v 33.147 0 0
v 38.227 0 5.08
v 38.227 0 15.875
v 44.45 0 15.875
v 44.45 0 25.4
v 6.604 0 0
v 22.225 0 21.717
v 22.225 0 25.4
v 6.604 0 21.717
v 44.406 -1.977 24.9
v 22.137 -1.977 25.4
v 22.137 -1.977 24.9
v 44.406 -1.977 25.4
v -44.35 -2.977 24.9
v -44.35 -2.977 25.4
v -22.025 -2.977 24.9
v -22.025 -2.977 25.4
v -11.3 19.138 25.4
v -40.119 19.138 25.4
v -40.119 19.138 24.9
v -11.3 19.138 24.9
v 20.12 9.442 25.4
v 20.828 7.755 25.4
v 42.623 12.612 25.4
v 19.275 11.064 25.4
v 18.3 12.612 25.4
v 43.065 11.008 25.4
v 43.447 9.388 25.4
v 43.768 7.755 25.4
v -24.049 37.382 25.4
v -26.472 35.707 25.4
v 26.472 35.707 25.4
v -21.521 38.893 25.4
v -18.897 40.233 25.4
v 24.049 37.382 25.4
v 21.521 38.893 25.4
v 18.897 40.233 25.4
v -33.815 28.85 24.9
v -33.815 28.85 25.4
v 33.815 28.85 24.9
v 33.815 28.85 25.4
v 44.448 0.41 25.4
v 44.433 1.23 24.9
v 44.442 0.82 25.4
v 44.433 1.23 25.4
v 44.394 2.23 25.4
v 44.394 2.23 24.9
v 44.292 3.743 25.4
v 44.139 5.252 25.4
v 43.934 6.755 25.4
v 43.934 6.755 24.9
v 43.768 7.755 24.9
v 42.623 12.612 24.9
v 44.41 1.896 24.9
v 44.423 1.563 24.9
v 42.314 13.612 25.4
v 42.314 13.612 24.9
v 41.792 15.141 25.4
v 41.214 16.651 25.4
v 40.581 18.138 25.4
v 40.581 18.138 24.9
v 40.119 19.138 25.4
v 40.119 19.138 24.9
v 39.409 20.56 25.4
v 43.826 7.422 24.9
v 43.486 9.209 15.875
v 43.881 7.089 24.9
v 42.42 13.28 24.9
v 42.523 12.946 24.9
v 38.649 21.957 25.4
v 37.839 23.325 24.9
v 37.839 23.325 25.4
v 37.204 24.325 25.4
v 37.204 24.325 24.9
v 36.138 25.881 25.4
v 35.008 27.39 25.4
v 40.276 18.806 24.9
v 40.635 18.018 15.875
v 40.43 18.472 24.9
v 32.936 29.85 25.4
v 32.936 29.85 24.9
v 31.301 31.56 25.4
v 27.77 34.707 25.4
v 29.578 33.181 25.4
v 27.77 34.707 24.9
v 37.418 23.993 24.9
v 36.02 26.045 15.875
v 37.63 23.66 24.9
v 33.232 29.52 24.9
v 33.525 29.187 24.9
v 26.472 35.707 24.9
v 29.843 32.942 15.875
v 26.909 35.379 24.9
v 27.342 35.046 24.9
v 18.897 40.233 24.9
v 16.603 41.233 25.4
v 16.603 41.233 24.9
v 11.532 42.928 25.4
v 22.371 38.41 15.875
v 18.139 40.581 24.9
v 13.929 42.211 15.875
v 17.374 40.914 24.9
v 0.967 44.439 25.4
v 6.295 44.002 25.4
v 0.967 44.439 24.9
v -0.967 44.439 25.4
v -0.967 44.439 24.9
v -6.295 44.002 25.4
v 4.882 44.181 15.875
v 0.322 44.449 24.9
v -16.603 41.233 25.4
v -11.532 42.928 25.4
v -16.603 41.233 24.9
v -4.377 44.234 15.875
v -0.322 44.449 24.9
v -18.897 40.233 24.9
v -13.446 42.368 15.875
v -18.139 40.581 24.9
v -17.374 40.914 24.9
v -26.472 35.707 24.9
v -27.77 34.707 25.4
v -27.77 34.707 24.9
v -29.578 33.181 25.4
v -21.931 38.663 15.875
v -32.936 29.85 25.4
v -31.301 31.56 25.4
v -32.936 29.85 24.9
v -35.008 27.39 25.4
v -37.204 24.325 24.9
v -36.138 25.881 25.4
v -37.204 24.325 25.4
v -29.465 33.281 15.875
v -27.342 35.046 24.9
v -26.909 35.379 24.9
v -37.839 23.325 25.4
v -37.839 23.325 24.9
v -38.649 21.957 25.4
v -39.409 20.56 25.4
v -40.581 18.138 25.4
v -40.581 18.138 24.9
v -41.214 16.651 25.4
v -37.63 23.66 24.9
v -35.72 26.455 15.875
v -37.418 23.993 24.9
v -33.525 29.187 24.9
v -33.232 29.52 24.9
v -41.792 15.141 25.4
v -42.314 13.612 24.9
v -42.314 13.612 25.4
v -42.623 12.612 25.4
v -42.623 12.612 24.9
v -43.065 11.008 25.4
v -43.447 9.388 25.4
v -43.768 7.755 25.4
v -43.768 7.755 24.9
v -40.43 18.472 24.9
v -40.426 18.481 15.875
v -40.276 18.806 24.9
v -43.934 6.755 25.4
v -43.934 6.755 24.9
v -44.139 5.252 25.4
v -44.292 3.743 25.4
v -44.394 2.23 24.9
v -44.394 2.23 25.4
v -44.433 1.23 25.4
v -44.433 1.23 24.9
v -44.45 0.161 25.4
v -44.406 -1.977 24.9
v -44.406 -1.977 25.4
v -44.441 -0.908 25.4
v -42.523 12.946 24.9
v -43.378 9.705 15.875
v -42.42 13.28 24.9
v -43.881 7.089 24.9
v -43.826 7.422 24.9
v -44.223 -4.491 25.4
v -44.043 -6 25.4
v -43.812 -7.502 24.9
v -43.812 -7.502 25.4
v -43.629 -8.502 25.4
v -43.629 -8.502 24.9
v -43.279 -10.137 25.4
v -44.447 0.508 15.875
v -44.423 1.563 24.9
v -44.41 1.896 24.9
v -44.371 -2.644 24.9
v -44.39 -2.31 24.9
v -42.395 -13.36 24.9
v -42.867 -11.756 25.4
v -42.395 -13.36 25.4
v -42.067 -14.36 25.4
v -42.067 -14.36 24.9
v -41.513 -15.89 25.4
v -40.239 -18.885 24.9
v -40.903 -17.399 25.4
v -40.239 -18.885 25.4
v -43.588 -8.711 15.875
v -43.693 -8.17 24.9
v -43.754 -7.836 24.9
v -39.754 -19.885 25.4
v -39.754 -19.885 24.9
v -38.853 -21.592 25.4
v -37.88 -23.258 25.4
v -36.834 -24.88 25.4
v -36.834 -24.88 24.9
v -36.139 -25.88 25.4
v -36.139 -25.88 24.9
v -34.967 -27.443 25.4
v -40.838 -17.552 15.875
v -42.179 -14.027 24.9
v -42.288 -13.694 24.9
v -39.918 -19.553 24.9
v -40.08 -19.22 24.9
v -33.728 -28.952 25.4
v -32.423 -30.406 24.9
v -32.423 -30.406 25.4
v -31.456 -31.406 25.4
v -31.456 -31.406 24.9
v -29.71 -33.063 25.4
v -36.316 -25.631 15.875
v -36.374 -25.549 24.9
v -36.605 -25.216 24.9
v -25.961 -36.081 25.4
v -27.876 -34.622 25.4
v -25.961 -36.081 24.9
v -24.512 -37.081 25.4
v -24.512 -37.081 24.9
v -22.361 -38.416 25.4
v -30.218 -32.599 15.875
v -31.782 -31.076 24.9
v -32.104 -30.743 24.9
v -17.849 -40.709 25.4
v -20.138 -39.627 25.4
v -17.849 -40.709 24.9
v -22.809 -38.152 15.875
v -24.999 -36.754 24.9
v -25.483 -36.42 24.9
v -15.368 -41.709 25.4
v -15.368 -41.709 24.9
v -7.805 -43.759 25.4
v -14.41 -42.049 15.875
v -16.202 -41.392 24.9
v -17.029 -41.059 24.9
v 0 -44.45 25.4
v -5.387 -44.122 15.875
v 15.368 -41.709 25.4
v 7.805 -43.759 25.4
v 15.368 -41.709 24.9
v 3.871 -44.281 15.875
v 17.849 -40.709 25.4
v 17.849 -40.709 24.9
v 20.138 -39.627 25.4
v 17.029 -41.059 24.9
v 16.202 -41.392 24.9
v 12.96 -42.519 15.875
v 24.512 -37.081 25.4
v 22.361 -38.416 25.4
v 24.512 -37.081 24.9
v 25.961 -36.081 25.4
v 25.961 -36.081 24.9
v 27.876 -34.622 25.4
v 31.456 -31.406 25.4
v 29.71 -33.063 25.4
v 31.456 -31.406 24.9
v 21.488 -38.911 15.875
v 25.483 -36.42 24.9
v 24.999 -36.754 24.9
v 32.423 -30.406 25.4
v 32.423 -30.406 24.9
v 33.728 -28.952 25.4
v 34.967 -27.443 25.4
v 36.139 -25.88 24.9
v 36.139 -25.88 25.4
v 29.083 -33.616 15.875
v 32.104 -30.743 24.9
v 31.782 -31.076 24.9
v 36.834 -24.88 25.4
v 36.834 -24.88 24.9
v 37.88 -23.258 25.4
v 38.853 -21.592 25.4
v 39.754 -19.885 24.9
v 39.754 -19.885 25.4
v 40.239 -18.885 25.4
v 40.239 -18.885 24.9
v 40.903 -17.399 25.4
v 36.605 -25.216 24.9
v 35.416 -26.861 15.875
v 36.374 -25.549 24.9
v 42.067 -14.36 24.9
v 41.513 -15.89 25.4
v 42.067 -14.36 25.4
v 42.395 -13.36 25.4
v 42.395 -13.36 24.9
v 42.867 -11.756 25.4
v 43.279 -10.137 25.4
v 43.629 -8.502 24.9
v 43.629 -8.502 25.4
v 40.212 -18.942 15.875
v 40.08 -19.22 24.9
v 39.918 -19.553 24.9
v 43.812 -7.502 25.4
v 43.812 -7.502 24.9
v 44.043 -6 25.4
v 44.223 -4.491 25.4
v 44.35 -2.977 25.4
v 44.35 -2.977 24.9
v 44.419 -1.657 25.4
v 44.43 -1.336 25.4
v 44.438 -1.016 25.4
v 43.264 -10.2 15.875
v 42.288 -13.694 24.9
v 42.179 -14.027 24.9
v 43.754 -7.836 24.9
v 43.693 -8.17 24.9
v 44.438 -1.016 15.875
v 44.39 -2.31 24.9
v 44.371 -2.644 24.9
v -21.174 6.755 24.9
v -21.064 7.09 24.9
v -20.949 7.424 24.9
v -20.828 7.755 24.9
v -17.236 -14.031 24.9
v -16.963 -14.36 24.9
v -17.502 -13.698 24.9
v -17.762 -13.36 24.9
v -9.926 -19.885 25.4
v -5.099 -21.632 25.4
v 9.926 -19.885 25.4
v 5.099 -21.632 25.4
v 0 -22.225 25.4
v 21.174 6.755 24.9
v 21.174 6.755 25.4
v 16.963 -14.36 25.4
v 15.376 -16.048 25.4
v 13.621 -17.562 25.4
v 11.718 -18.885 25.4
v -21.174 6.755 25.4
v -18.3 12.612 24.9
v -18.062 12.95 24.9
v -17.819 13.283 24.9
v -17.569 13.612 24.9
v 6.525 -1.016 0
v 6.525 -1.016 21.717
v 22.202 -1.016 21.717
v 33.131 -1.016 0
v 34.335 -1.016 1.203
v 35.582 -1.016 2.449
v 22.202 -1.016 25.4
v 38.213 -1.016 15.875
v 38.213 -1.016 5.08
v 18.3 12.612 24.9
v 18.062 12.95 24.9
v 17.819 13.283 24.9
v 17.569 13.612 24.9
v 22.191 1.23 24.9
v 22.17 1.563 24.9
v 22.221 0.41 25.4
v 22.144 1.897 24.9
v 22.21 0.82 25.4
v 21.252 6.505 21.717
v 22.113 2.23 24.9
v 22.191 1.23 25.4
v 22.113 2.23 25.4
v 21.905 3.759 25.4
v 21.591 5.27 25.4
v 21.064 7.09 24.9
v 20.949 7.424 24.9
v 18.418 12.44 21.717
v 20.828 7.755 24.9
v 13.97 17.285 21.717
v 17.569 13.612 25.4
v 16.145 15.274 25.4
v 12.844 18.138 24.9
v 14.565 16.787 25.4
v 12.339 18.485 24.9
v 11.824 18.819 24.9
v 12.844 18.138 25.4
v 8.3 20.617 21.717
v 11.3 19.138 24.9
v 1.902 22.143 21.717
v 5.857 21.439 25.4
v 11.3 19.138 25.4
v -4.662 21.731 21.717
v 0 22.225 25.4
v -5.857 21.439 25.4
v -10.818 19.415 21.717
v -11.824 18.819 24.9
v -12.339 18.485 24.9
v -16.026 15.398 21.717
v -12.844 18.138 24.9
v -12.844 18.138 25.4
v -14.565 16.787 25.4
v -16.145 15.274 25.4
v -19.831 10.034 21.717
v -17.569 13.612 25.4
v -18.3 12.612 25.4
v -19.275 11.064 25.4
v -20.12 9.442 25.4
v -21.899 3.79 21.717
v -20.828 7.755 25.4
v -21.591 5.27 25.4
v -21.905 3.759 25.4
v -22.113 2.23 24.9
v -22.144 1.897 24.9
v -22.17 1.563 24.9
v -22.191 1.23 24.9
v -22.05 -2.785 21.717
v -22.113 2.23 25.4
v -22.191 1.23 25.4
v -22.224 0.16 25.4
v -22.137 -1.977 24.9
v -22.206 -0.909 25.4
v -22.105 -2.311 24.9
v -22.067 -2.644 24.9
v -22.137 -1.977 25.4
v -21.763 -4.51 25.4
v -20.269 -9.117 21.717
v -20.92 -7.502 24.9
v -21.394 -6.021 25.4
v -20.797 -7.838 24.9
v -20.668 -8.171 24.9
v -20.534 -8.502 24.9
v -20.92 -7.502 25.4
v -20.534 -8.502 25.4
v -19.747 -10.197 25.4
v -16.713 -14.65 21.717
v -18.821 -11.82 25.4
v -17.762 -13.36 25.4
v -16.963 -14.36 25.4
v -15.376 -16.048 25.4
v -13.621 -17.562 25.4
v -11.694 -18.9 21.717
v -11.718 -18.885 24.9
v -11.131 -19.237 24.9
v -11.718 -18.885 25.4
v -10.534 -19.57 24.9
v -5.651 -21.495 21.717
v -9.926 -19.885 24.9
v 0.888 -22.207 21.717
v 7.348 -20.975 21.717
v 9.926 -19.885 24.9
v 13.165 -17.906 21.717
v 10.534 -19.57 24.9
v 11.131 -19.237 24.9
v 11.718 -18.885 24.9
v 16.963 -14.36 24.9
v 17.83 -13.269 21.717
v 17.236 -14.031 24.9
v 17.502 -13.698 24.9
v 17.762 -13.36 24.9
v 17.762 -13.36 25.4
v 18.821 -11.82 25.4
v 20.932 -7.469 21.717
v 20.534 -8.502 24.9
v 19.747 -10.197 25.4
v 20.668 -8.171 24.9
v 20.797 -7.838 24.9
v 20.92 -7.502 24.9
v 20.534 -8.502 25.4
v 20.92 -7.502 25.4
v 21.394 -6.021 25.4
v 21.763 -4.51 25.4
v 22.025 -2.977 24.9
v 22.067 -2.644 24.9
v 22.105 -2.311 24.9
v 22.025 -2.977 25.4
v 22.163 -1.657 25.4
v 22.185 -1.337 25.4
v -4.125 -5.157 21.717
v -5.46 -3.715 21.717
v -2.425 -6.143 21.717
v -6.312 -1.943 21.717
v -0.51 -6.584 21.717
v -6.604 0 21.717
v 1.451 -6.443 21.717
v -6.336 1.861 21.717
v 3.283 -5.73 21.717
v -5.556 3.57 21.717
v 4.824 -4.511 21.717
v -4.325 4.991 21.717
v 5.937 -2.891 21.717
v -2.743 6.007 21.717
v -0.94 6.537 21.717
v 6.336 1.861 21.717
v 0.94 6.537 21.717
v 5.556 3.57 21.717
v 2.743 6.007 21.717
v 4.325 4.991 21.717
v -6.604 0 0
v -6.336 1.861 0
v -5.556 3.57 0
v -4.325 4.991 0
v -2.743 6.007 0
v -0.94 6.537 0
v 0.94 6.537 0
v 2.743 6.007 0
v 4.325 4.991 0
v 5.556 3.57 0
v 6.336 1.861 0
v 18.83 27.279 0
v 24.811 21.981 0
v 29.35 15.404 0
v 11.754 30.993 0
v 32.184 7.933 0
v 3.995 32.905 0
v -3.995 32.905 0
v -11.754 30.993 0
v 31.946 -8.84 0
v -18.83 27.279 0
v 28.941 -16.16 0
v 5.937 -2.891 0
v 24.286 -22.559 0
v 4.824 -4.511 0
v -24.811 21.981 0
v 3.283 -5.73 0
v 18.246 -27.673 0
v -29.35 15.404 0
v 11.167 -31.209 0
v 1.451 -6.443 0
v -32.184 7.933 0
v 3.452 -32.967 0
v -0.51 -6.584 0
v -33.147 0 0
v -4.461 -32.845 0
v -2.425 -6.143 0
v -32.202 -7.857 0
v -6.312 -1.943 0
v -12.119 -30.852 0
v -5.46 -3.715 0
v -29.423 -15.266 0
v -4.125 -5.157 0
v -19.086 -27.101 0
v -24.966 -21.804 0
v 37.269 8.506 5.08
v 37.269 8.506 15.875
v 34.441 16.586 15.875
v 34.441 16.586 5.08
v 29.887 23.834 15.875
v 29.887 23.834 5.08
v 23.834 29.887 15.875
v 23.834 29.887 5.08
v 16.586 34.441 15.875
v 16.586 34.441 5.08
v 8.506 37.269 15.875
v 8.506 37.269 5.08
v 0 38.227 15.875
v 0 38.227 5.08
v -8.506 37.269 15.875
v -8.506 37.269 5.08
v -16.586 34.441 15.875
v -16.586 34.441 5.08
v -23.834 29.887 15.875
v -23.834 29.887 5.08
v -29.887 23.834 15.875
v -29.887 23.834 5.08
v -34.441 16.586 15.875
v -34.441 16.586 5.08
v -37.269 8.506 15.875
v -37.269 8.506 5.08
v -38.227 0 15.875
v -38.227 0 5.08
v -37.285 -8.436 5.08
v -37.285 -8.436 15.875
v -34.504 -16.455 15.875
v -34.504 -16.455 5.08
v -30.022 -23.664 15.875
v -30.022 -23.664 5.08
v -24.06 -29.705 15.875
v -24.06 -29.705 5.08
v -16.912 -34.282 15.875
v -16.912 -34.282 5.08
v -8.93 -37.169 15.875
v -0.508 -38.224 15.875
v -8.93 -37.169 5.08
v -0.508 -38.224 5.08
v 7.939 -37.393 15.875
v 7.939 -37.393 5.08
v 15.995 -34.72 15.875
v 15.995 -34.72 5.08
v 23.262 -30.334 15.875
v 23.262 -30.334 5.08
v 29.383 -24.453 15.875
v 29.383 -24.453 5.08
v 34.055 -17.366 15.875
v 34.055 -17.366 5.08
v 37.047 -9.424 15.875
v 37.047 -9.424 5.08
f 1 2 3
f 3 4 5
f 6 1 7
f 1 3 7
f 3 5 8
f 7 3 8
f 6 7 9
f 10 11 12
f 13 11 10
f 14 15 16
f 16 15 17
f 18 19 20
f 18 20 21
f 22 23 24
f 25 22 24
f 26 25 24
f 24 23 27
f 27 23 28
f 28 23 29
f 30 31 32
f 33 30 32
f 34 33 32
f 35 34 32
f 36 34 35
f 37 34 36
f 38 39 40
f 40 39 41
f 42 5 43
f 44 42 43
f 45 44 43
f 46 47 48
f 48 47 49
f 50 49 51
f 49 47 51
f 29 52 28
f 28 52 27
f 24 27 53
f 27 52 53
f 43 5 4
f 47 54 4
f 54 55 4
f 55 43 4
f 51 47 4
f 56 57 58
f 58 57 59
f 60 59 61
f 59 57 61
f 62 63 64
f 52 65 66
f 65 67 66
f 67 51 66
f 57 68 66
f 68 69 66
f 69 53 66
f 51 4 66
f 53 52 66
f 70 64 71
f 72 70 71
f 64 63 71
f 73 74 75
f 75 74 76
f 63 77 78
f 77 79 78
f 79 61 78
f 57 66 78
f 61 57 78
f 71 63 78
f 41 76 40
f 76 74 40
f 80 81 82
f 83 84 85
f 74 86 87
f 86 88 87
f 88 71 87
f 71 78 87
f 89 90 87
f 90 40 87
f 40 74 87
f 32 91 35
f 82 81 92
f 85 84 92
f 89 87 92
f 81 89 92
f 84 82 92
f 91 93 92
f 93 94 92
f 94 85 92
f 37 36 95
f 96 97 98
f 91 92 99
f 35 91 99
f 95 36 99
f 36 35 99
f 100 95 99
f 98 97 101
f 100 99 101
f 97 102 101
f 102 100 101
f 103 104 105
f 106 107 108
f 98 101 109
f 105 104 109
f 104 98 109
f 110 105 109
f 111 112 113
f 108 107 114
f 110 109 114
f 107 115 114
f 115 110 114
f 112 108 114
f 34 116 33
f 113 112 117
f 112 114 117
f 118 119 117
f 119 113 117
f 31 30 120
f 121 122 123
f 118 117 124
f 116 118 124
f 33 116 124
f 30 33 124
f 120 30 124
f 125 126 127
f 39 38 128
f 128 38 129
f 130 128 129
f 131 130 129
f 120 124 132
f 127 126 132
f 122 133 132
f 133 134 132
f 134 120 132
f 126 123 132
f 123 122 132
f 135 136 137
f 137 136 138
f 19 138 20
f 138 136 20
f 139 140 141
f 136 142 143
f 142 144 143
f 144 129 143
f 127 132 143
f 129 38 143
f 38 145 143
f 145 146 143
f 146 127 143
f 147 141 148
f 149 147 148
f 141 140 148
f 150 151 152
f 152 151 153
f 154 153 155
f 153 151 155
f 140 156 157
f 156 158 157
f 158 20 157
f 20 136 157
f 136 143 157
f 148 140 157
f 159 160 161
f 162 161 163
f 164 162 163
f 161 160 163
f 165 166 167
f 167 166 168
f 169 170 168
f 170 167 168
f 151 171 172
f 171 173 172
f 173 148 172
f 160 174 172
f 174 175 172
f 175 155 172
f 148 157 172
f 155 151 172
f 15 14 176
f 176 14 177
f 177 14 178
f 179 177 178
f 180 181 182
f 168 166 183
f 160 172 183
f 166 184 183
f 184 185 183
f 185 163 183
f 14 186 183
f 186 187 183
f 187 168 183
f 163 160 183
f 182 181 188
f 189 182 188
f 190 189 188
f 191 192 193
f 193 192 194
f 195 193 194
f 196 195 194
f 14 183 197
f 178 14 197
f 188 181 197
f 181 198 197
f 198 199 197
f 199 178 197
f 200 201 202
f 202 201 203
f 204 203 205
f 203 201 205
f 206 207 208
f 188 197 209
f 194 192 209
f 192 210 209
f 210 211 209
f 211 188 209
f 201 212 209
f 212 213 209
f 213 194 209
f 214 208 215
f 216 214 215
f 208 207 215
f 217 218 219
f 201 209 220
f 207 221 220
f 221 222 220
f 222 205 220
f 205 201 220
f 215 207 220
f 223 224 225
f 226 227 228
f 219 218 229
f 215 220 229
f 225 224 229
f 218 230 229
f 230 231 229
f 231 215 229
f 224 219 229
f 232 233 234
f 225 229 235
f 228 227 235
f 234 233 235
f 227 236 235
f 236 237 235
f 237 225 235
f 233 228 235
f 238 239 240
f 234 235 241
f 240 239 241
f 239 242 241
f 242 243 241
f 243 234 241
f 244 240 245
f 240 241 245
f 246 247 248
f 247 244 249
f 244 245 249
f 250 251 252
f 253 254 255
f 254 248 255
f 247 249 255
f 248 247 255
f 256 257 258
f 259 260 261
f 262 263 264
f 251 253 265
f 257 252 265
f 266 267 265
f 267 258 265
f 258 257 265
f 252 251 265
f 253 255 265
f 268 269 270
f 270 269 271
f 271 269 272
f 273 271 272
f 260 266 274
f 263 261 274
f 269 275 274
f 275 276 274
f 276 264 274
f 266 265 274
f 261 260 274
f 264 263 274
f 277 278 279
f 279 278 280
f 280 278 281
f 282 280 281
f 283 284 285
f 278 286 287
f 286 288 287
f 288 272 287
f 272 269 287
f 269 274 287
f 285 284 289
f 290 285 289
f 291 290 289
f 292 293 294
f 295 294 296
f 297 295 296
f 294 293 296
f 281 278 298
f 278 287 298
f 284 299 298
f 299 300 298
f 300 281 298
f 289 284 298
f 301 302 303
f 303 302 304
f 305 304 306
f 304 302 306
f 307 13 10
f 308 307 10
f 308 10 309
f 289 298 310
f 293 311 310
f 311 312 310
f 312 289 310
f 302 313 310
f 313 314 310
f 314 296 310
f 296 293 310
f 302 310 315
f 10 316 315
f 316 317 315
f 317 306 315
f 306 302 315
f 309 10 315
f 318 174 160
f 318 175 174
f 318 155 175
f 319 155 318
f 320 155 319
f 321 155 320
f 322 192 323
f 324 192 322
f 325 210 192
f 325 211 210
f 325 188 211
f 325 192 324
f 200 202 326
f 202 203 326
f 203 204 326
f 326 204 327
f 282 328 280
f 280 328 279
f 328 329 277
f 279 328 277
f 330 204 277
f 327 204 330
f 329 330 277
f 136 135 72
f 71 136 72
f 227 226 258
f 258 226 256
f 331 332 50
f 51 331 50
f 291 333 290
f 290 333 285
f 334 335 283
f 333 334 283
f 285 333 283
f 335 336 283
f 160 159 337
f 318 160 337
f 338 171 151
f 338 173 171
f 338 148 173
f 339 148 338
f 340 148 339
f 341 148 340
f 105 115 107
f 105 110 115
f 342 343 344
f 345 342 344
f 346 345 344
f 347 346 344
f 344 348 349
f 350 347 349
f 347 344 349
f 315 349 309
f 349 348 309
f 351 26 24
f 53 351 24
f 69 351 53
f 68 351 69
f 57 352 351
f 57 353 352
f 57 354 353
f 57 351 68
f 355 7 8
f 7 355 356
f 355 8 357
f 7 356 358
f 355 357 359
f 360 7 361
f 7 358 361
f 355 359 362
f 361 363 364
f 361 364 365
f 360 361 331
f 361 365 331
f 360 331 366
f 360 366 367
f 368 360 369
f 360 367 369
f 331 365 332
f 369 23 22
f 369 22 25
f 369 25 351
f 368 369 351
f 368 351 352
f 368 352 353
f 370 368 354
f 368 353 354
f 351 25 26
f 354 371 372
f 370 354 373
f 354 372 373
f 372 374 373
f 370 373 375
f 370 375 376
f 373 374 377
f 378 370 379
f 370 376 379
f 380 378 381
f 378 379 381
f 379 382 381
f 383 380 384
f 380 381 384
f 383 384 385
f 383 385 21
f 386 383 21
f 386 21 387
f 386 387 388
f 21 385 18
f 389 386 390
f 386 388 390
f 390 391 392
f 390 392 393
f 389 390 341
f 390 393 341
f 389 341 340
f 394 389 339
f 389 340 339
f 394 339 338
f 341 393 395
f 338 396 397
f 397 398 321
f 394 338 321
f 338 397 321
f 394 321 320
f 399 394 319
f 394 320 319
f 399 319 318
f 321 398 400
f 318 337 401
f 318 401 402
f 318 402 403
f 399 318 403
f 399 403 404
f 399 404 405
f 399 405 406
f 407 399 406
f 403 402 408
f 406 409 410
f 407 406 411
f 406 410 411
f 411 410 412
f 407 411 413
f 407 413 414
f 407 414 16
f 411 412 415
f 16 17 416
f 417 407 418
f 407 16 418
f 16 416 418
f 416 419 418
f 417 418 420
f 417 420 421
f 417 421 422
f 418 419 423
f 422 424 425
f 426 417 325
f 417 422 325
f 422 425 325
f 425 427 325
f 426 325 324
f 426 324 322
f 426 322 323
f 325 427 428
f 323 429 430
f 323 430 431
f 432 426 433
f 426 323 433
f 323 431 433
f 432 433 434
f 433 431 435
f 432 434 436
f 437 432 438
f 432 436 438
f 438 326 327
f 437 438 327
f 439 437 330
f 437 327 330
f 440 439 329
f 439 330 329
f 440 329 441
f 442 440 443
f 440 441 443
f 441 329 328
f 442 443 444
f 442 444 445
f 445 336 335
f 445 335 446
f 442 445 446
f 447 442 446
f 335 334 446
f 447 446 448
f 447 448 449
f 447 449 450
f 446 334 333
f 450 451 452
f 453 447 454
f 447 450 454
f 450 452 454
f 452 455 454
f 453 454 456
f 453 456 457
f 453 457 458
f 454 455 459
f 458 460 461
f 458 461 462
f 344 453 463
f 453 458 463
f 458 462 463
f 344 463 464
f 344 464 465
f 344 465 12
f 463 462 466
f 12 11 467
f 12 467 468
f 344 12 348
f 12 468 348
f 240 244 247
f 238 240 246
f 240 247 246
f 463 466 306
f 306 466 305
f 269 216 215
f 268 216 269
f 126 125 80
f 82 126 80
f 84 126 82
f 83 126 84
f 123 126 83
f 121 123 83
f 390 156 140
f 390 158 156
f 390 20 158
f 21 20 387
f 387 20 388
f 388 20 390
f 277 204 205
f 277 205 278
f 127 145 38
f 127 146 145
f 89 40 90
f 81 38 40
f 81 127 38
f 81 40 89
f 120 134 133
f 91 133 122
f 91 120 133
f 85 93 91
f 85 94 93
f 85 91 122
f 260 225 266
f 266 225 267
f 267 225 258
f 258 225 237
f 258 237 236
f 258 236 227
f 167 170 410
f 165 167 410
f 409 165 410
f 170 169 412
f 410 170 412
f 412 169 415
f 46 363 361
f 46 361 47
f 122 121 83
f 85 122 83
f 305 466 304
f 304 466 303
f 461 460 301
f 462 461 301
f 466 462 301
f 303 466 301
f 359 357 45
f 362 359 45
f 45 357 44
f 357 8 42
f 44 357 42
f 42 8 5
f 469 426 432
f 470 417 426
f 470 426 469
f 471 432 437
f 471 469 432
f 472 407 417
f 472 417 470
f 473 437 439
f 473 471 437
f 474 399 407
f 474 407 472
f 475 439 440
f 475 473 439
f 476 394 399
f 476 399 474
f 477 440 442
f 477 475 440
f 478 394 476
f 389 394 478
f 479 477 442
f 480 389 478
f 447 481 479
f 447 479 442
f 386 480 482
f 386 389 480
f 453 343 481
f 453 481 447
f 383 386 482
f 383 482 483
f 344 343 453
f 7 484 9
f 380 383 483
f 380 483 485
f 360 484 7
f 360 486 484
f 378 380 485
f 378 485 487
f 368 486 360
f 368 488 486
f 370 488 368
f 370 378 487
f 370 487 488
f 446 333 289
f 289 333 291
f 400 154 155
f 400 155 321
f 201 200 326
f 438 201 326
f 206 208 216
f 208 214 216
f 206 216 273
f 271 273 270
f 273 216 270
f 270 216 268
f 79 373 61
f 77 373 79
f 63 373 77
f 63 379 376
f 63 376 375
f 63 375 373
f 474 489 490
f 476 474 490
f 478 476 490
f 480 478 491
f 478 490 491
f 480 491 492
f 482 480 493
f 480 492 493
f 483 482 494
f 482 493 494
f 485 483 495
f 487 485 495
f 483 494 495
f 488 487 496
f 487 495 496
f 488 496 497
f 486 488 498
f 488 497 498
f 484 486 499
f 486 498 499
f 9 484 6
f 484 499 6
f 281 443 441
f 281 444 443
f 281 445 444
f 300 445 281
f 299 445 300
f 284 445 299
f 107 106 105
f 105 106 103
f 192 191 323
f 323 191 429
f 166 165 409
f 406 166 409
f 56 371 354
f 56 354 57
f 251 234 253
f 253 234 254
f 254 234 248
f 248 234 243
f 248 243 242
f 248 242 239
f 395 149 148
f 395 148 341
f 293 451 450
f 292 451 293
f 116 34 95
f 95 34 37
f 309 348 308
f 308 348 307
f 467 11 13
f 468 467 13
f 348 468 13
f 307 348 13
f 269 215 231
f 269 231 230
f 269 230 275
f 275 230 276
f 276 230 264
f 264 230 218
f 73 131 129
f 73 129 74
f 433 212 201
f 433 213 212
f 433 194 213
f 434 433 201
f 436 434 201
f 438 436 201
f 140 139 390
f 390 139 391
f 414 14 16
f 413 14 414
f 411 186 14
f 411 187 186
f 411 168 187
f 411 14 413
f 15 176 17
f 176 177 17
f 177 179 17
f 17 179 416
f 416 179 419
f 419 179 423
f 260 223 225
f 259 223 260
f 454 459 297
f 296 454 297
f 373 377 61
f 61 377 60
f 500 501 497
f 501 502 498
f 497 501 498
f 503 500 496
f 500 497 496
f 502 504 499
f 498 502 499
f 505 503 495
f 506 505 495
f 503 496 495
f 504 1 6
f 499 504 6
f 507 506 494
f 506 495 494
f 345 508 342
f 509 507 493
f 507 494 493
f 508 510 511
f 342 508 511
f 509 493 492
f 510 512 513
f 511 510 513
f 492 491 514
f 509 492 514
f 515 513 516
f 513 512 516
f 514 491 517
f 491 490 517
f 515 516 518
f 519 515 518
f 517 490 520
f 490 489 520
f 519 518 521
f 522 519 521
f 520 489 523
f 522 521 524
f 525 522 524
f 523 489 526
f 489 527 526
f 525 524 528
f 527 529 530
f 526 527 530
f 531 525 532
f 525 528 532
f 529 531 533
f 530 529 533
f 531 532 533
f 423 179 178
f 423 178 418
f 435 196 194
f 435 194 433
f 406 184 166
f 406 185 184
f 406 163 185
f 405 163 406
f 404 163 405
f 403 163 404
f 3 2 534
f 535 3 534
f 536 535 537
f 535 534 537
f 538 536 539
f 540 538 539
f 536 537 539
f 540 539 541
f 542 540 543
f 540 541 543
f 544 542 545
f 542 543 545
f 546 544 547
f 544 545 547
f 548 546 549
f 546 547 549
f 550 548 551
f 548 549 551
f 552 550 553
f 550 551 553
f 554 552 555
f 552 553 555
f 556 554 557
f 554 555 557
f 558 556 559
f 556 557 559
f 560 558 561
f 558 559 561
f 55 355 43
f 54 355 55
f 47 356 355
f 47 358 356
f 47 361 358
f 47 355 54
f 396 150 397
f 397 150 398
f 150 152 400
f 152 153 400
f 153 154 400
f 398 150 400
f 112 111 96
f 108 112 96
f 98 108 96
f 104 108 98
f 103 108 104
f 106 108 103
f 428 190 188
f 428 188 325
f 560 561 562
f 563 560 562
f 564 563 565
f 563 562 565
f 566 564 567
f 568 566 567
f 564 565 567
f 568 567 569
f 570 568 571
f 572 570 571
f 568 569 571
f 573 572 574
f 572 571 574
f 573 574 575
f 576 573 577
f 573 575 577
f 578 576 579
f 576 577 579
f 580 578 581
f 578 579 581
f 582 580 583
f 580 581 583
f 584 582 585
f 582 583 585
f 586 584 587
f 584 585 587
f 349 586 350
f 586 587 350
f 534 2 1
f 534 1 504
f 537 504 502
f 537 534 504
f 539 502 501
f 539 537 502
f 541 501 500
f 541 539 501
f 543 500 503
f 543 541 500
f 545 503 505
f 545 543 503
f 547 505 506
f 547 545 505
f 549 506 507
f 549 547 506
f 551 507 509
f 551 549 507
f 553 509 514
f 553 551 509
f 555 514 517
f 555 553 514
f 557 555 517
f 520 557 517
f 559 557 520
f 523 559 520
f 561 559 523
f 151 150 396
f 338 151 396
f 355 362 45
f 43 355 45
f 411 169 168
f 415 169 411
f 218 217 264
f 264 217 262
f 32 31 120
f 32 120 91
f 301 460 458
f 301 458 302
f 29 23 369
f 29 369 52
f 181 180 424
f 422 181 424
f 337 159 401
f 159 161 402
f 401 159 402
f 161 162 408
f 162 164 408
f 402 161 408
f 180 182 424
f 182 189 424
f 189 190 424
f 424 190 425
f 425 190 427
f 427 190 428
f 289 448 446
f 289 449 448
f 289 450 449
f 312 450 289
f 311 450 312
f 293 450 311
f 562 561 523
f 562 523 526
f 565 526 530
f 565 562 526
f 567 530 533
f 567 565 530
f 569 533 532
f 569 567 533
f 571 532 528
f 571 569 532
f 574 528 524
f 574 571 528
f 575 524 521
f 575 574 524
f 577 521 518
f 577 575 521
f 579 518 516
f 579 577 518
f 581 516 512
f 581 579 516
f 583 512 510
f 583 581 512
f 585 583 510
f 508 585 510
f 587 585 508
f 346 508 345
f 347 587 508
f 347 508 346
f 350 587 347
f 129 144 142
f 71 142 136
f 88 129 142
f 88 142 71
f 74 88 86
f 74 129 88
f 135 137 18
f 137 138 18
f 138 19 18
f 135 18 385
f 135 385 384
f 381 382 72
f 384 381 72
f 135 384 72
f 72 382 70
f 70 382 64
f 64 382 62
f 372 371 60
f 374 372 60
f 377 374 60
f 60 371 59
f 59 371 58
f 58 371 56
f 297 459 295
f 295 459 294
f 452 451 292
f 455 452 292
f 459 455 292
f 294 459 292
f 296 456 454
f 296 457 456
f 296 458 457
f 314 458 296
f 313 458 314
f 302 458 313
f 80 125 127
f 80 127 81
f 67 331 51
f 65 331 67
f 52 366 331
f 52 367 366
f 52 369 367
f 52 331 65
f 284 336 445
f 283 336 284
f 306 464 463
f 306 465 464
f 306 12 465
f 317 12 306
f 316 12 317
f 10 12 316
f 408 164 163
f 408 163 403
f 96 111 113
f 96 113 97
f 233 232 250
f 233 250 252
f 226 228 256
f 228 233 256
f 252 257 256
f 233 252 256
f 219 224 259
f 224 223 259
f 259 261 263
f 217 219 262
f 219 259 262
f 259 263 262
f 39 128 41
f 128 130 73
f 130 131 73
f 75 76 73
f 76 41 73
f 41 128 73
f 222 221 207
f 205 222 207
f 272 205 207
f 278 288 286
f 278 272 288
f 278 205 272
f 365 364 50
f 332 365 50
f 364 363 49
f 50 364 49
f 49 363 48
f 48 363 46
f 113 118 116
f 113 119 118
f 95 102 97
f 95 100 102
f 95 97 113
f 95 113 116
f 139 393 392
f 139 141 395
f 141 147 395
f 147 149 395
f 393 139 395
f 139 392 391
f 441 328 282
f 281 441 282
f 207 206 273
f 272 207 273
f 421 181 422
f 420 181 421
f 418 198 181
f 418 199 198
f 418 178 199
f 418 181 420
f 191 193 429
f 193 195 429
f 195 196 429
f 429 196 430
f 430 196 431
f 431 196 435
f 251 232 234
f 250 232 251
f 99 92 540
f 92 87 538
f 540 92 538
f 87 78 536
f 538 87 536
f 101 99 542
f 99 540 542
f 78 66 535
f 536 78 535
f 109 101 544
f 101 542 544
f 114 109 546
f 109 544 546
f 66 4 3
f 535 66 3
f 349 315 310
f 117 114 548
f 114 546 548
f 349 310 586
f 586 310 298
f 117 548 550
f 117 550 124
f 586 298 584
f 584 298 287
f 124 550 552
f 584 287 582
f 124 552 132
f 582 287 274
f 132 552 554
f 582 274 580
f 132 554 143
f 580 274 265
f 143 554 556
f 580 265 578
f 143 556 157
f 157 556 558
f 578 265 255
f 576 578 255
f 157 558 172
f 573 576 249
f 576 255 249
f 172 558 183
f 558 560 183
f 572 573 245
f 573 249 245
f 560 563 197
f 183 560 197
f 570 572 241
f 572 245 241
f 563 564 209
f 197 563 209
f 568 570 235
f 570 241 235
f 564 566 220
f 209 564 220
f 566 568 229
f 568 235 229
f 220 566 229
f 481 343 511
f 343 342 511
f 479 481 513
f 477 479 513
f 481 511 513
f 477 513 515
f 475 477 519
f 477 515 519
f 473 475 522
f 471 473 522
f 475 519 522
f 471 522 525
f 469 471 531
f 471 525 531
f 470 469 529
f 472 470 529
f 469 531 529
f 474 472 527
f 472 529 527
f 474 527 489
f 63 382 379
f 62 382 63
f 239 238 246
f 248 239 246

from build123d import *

# Parameters (mm, degrees)
F3_D           = 13.208
F3_CBORE_D     = 44.45
F3_CBORE_DEPTH = 3.683
F2_W           = 44.336462139
F2_H           = 1.016
F4_DEPTH       = 38.1
F5_SIZE        = 5.08
F6_W           = 101.6
F6_H           = 1
F7_DEPTH       = 0.5


with BuildPart() as f1:
    # F0 (on Front) → F1 (revolve)
    with BuildSketch(Plane.XZ):
        Polygon((-38.227, 0), (0, 0), (0, 25.4), (-44.45, 25.4), (-44.45, 15.875), (-38.227, 15.875), align=None)
    revolve(axis=Axis((0, 0, 19.0648827702), (0, 0, 1)))

    # F3 (through all)
    with Locations(Plane.XY.offset(25.4)):
        with Locations((0, 0)):
            CounterBoreHole(F3_D / 2, F3_CBORE_D / 2, F3_CBORE_DEPTH)

    # F2 (on face) → F4 (cut)
    with BuildSketch(Plane.XY.offset(25.4)):
        with Locations((22.1682310695, -0.508)):
            Rectangle(F2_W, F2_H)
        with BuildLine():
            Line((44.336462139, 0), (44.336462139, -1.016))
            Line((44.336462139, -1.016), (44.4383870544, -1.016))
            ThreePointArc((44.4383870544, -1.016), (44.4470966688, -0.5080331831), (44.45, 0))
            Line((44.45, 0), (44.336462139, 0))
        make_face()
        with BuildLine():
            ThreePointArc((44.45, 0), (44.4470966688, -0.5080331831), (44.4383870544, -1.016))
            Line((44.4383870544, -1.016), (50.8, -1.016))
            Line((50.8, -1.016), (50.8, 0))
            Line((50.8, 0), (44.45, 0))
        make_face()
    extrude(amount=-F4_DEPTH, mode=Mode.SUBTRACT)

    # F5
    f5_edges = [f1.edges().sort_by_distance(p)[0] for p in [
        (-0.508045, -38.223624, 0),
    ]]
    chamfer(f5_edges, length=F5_SIZE)

    # F6 (on face) → F7 (cut)
    with BuildSketch(Plane.XY.offset(25.4)):
        with Locations((0, -25.3804288805)):
            Rectangle(F6_W, F6_H)
        with Locations((0, -30.9059806168)):
            Rectangle(F6_W, F6_H)
        with Locations((2.5503417128, -36.5805682886)):
            Rectangle(F6_W, F6_H)
        with Locations((0.3315322974, 44.9394750249)):
            Rectangle(F6_W, F6_H)
        with Locations((0.3083095216, 40.7329852533)):
            Rectangle(F6_W, F6_H)
        with Locations((0.3083095216, 35.207433517)):
            Rectangle(F6_W, F6_H)
        with Locations((0.6398418191, 29.3503458452)):
            Rectangle(F6_W, F6_H)
        with Locations((0.6398418191, 23.8247941089)):
            Rectangle(F6_W, F6_H)
        with Locations((0.5792960728, 18.6377671853)):
            Rectangle(F6_W, F6_H)
        with Locations((0.5792960728, 13.112215449)):
            Rectangle(F6_W, F6_H)
        with Locations((0.9108283703, 7.2551277772)):
            Rectangle(F6_W, F6_H)
        with Locations((0.9108283703, 1.7295760409)):
            Rectangle(F6_W, F6_H)
        with Locations((0.8876055945, -2.4769137307)):
            Rectangle(F6_W, F6_H)
        with Locations((0.8876055945, -8.0024654671)):
            Rectangle(F6_W, F6_H)
        with Locations((1.2191378919, -13.8595531388)):
            Rectangle(F6_W, F6_H)
        with Locations((1.2191378919, -19.3851048752)):
            Rectangle(F6_W, F6_H)
        with Locations((1.0724808089, -41.2088056254)):
            Rectangle(F6_W, F6_H)
    extrude(amount=-F7_DEPTH, mode=Mode.SUBTRACT)


solid = f1.part
